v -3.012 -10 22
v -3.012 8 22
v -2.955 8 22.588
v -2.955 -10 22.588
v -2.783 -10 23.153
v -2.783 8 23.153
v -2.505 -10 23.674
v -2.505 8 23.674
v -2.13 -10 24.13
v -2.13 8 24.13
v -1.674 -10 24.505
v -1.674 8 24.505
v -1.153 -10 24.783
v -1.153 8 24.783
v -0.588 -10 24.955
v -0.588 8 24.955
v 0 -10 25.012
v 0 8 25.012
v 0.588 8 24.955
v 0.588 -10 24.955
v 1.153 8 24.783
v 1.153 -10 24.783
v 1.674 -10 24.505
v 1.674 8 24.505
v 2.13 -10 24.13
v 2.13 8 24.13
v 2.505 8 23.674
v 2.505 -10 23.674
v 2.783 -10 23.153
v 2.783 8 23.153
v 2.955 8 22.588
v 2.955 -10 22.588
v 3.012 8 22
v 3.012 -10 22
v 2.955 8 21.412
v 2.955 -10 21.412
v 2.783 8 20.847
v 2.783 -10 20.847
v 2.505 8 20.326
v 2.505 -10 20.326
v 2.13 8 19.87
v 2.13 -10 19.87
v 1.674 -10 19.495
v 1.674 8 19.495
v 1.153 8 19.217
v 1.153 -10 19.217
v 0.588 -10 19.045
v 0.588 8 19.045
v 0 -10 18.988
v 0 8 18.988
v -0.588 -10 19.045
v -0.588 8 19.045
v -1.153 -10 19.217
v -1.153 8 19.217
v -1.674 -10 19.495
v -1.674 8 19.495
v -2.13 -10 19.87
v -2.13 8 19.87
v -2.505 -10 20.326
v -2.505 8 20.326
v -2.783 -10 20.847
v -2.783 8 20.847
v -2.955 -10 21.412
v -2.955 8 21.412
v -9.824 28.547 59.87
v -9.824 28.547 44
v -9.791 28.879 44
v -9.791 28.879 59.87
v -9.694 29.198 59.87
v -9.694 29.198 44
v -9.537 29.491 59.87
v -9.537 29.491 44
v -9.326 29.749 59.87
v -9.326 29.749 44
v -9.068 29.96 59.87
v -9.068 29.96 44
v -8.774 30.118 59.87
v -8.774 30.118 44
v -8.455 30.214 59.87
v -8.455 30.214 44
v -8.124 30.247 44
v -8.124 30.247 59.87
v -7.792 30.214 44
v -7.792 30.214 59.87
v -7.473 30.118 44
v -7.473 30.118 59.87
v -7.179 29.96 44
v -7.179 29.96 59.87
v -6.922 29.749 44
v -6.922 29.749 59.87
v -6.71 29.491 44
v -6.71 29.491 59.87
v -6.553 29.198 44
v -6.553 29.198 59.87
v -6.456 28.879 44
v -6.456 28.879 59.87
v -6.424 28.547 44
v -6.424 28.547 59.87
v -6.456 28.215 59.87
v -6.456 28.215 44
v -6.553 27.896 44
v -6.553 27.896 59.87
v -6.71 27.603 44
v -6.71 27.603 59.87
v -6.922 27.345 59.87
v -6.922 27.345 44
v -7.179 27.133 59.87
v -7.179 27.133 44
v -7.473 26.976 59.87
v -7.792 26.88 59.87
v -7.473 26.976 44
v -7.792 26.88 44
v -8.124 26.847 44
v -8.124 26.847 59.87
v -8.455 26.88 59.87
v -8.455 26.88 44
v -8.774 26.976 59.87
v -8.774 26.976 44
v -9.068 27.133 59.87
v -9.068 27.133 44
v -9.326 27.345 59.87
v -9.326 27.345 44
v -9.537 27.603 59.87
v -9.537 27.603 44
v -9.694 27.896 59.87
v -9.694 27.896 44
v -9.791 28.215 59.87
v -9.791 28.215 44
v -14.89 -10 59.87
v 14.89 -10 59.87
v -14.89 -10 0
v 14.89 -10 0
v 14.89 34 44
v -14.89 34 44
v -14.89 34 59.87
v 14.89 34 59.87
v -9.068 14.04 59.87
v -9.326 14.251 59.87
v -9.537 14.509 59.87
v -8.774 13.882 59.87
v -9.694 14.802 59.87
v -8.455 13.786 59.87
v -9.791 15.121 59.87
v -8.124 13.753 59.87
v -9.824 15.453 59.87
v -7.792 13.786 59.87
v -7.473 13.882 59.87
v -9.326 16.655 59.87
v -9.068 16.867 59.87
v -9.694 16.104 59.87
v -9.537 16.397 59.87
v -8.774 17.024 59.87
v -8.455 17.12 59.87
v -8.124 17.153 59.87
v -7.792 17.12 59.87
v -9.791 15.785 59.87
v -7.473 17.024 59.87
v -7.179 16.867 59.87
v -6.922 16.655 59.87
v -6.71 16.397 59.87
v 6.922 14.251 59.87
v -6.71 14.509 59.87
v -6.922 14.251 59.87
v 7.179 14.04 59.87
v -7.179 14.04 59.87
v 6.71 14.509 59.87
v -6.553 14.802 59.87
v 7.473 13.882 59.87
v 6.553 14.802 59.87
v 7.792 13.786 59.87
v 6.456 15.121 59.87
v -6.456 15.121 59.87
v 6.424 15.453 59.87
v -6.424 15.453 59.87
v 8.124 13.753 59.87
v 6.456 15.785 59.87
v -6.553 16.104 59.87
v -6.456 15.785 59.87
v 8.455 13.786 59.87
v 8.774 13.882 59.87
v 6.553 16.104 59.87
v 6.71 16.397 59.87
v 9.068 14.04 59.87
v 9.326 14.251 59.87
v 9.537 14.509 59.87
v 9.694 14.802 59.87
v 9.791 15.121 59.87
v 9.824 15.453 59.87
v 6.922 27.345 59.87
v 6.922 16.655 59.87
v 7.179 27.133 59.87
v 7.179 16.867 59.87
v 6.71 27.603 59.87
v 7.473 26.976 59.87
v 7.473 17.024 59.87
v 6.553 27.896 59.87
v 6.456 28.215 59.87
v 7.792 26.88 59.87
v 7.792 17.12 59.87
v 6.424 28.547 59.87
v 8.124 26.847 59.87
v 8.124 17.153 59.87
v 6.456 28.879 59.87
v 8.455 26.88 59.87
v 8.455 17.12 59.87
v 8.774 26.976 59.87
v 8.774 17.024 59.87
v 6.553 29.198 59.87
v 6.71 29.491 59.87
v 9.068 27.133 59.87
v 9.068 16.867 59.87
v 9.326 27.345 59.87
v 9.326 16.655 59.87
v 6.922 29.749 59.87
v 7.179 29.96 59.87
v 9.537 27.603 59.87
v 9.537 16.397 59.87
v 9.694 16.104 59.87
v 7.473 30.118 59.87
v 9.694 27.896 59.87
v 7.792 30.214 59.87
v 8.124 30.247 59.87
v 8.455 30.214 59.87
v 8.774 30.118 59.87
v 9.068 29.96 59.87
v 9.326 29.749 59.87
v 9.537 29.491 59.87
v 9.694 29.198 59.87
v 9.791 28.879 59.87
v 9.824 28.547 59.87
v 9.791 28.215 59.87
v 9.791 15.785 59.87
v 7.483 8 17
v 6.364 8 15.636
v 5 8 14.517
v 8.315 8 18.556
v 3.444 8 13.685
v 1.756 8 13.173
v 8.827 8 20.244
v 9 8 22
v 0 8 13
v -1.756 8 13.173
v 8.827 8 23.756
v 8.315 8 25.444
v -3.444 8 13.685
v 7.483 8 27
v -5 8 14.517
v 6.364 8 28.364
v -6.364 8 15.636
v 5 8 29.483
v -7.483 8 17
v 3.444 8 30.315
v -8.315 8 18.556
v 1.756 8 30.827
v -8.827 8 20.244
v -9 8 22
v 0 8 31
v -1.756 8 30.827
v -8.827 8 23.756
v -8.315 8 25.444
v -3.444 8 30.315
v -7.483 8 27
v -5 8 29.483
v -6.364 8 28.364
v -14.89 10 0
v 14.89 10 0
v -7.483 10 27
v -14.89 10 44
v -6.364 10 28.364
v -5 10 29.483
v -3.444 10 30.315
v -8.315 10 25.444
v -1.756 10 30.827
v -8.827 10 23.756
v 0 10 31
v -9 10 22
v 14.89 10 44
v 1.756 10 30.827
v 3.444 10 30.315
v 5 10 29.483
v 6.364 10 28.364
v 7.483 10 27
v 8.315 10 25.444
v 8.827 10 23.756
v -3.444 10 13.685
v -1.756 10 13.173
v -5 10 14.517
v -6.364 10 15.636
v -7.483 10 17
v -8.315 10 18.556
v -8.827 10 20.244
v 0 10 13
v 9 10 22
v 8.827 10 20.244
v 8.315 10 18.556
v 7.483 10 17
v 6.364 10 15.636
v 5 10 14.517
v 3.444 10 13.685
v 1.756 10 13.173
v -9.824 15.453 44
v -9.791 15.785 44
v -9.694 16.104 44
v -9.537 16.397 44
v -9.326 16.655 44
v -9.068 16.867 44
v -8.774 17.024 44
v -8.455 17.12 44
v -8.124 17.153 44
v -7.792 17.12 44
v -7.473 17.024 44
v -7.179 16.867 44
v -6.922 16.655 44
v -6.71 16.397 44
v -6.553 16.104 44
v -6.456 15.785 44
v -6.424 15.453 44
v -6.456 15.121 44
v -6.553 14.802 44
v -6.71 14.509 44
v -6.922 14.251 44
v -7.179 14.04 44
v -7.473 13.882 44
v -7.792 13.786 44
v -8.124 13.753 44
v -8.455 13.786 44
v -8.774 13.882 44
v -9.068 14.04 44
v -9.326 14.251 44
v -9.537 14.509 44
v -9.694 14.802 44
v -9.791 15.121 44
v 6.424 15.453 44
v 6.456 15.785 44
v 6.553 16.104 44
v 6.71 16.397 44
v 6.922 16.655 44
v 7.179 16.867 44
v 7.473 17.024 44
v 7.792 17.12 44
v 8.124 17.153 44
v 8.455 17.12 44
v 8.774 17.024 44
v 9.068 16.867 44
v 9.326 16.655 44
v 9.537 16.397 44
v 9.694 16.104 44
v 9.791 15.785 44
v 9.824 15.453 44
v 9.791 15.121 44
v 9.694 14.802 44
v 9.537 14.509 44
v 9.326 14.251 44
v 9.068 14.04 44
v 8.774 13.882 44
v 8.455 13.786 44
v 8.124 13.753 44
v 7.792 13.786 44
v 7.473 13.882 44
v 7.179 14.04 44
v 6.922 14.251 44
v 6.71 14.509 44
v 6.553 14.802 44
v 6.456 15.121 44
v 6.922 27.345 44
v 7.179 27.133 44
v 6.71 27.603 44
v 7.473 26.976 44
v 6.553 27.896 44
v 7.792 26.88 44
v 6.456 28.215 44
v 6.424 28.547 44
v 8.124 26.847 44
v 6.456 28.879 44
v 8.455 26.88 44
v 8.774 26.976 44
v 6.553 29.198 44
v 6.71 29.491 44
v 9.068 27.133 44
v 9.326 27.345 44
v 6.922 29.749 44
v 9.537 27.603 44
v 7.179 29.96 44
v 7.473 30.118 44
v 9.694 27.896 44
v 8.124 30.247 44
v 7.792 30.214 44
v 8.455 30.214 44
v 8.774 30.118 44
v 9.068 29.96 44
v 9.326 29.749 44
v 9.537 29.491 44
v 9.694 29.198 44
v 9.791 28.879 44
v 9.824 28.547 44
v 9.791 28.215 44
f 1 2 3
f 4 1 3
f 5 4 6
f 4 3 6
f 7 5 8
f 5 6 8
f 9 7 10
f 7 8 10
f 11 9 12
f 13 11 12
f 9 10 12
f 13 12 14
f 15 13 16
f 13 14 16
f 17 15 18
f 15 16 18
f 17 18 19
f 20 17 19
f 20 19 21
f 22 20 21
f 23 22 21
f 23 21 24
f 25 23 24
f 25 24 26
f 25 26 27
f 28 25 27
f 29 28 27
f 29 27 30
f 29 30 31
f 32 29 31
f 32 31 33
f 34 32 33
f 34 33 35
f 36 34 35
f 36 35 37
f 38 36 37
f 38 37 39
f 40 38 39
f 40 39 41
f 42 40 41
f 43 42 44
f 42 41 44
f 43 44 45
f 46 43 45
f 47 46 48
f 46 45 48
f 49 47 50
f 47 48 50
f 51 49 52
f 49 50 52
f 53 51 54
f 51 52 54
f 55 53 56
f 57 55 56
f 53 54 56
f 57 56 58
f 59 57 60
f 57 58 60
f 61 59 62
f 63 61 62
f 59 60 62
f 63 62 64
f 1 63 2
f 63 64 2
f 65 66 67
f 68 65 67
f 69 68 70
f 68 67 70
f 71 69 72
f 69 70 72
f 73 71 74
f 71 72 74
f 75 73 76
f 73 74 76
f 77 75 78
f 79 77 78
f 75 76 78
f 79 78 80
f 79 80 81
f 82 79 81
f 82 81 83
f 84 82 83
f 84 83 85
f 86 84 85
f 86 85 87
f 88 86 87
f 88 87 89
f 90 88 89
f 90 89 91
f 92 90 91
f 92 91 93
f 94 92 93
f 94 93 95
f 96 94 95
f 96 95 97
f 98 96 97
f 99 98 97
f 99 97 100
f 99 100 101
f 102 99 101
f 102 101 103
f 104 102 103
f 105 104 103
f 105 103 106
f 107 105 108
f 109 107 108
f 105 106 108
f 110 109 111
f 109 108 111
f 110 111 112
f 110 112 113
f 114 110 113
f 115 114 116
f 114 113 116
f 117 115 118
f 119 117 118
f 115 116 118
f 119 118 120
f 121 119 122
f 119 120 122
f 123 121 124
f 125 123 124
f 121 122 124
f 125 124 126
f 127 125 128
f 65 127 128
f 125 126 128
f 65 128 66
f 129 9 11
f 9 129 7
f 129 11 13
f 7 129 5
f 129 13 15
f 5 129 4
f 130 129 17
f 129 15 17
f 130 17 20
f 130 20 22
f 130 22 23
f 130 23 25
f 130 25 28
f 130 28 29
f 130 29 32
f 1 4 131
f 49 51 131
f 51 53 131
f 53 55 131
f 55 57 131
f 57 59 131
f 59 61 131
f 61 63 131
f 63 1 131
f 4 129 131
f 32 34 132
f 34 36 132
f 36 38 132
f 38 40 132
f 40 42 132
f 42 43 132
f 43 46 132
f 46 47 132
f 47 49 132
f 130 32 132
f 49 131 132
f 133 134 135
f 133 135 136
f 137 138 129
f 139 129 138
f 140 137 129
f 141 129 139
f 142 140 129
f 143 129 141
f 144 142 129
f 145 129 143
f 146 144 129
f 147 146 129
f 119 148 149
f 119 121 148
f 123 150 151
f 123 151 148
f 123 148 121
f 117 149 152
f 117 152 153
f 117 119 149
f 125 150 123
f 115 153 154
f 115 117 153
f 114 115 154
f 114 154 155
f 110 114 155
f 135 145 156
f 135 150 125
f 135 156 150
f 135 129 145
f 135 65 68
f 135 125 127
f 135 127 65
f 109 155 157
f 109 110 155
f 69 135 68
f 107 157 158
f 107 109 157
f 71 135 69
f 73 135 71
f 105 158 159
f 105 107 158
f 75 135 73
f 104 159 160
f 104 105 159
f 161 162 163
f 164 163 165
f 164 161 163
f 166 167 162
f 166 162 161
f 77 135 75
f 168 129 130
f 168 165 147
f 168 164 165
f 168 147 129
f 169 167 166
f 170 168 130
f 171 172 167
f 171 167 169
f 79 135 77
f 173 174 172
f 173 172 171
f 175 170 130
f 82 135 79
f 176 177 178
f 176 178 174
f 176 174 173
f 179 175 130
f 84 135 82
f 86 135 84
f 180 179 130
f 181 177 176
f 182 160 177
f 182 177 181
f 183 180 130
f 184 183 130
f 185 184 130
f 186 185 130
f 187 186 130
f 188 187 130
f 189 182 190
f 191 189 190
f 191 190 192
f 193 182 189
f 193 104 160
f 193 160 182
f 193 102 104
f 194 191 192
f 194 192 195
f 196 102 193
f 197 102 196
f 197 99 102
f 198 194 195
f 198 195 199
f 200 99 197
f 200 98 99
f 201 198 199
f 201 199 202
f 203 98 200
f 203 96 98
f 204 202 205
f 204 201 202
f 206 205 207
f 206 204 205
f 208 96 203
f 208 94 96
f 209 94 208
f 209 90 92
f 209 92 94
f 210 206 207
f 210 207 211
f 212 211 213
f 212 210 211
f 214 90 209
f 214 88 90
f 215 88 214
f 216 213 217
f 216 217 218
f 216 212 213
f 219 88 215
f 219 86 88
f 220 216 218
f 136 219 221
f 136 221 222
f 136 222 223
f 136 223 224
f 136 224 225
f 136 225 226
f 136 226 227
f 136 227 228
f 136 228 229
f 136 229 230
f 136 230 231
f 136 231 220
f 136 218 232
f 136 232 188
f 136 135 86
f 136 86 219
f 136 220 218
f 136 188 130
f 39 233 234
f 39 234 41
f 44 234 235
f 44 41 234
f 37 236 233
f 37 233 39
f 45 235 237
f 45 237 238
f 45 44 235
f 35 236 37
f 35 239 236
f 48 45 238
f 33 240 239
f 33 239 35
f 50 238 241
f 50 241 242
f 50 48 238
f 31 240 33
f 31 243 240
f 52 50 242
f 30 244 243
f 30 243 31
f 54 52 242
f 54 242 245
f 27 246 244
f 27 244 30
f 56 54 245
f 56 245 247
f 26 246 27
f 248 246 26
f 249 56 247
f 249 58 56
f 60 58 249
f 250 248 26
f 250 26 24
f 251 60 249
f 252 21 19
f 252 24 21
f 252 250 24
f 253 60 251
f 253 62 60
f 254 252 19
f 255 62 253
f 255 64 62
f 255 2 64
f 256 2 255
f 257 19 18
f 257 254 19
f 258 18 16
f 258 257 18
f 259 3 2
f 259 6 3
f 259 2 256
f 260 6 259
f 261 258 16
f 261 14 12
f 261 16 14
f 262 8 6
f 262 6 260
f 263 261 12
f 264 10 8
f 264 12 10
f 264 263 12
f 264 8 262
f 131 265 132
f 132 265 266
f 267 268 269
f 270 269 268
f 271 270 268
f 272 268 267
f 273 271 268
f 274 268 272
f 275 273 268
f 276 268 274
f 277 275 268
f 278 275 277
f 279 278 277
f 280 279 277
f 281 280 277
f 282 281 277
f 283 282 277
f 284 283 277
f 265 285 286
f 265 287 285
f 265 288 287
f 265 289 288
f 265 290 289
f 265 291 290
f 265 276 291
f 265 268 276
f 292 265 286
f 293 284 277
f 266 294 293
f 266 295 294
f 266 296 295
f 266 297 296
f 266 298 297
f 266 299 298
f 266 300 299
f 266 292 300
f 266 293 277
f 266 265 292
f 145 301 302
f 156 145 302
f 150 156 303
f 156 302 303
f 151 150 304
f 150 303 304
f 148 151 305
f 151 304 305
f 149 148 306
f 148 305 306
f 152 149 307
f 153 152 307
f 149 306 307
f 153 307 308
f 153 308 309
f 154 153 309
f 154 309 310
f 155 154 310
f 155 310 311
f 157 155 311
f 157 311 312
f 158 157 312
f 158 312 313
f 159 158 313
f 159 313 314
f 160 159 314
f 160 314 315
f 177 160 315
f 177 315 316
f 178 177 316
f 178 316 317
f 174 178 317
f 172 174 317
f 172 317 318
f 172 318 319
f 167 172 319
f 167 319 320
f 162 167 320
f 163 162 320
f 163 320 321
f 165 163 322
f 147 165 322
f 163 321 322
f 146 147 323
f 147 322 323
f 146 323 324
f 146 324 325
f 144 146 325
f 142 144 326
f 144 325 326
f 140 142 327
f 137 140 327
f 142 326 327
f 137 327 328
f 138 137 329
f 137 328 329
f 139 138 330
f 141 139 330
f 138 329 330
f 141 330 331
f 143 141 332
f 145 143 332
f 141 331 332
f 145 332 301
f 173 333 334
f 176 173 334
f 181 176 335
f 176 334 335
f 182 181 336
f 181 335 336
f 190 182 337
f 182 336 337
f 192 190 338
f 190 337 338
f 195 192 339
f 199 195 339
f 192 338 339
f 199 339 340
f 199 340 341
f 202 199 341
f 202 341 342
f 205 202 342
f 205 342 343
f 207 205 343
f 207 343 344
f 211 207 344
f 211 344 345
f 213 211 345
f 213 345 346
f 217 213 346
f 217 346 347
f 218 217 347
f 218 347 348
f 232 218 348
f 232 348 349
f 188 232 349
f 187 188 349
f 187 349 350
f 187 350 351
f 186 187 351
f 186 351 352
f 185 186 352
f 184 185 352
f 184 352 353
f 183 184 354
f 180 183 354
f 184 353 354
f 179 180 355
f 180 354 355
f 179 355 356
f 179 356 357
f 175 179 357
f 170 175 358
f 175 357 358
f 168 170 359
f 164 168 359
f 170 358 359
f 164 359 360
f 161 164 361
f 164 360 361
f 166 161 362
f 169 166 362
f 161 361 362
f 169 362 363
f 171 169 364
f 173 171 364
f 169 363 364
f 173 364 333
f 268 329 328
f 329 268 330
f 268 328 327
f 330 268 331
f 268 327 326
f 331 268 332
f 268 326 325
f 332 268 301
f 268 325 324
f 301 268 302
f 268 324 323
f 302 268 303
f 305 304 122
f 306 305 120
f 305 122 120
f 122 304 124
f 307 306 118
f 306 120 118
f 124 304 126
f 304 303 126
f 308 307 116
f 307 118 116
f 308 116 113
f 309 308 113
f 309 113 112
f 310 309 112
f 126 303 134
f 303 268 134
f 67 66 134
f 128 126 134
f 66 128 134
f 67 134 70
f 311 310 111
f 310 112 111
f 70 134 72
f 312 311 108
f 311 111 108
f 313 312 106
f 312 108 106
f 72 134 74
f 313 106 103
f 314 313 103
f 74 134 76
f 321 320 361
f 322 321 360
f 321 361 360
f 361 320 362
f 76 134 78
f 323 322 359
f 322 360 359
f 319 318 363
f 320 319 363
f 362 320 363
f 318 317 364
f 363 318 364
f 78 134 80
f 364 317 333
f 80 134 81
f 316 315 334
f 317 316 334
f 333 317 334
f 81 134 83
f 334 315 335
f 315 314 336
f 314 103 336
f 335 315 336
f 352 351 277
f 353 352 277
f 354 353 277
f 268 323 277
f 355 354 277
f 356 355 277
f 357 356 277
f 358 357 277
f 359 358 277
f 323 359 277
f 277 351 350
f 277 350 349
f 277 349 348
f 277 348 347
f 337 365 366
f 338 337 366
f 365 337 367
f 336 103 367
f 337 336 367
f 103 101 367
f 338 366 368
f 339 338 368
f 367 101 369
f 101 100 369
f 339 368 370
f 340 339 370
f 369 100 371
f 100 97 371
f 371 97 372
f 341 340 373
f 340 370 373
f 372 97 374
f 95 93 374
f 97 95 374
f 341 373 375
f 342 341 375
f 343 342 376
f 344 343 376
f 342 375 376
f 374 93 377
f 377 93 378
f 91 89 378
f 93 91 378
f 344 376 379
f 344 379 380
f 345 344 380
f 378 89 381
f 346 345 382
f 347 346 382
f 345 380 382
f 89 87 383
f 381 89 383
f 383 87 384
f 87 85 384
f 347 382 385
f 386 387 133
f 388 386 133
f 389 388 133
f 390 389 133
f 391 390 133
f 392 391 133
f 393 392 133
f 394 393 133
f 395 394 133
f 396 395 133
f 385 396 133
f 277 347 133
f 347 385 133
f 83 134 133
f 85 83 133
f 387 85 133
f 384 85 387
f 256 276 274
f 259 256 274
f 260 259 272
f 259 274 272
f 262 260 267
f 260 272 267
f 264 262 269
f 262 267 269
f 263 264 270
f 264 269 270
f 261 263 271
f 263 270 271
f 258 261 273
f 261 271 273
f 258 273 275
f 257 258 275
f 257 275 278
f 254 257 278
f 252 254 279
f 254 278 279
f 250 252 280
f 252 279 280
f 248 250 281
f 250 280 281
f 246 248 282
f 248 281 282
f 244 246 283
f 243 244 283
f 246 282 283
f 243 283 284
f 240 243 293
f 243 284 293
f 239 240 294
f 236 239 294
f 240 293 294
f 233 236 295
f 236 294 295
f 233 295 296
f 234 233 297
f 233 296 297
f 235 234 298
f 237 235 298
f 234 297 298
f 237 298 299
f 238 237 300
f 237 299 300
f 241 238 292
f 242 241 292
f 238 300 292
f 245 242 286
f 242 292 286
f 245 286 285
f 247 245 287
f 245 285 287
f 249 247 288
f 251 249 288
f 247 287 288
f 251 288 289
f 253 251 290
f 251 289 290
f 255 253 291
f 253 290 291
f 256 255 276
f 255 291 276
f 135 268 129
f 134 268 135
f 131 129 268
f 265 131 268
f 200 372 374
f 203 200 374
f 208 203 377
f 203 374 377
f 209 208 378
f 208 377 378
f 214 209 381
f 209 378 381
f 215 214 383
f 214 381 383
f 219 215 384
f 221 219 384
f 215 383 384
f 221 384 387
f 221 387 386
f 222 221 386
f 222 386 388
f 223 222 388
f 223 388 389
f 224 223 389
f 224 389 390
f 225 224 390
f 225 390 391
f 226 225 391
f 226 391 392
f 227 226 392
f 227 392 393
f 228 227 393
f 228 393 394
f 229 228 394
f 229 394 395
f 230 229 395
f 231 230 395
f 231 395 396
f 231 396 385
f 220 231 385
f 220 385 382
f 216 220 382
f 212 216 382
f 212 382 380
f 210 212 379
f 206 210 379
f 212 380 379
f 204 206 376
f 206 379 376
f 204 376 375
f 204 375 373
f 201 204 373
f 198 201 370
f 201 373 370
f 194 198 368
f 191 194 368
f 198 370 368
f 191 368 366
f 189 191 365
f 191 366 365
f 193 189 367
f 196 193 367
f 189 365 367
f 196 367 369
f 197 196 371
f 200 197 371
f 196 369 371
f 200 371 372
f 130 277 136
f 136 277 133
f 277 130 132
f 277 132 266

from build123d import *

# Parameters (mm, degrees)
SKETCH1_W           = 29.78
SKETCH1_H           = 20
BOSS_EXTRUDE2_DEPTH = 44
SKETCH4_W           = 29.78
SKETCH4_H           = 44
BOSS_EXTRUDE3_DEPTH = 15.87
SKETCH5_R           = 9
CUT_EXTRUDE1_DEPTH  = 2
SKETCH7_R           = 3.0125
CUT_EXTRUDE2_DEPTH  = 67.948704244
SKETCH8_R           = 1.7
CUT_EXTRUDE3_DEPTH  = 58.564851255


with BuildPart() as part:
    # Sketch1 → Boss-Extrude2 (new body)
    with BuildSketch(Plane.XY):
        Rectangle(SKETCH1_W, SKETCH1_H)
    extrude(amount=BOSS_EXTRUDE2_DEPTH)

    # Sketch4 → Boss-Extrude3 (add)
    with BuildSketch(Plane.XY.offset(44)):
        with Locations((0, 12)):
            Rectangle(SKETCH4_W, SKETCH4_H)
    extrude(amount=BOSS_EXTRUDE3_DEPTH)

    # Sketch5 → Cut-Extrude1 (cut)
    with BuildSketch(Plane(origin=(0, 10, 0), x_dir=(1, 0, 0), z_dir=(0, 1, 0))):
        with Locations(Location((0, -22, 0), (0, 0, 180))):
            Circle(SKETCH5_R)
    extrude(amount=-CUT_EXTRUDE1_DEPTH, mode=Mode.SUBTRACT)

    # Sketch7 → Cut-Extrude2 (cut, through all)
    with BuildSketch(Plane(origin=(0, 8, 0), x_dir=(1, 0, 0), z_dir=(0, 1, 0))):
        with Locations(Location((0, -22, 0), (0, 0, 180))):
            Circle(SKETCH7_R)
    extrude(amount=-CUT_EXTRUDE2_DEPTH, mode=Mode.SUBTRACT)

    # Sketch8 → Cut-Extrude3 (cut, through all)
    with BuildSketch(Plane(origin=(0, 0, 44), x_dir=(-1, 0, 0), z_dir=(0, 0, -1))):
        with Locations((-8.123713821, 28.54698226)):
            Circle(SKETCH8_R)
        with Locations((8.123713821, 28.54698226)):
            Circle(SKETCH8_R)
        with Locations((-8.123713821, 15.45301774)):
            Circle(SKETCH8_R)
        with Locations((8.123713821, 15.45301774)):
            Circle(SKETCH8_R)
    extrude(amount=-CUT_EXTRUDE3_DEPTH, mode=Mode.SUBTRACT)


solid = part.part
